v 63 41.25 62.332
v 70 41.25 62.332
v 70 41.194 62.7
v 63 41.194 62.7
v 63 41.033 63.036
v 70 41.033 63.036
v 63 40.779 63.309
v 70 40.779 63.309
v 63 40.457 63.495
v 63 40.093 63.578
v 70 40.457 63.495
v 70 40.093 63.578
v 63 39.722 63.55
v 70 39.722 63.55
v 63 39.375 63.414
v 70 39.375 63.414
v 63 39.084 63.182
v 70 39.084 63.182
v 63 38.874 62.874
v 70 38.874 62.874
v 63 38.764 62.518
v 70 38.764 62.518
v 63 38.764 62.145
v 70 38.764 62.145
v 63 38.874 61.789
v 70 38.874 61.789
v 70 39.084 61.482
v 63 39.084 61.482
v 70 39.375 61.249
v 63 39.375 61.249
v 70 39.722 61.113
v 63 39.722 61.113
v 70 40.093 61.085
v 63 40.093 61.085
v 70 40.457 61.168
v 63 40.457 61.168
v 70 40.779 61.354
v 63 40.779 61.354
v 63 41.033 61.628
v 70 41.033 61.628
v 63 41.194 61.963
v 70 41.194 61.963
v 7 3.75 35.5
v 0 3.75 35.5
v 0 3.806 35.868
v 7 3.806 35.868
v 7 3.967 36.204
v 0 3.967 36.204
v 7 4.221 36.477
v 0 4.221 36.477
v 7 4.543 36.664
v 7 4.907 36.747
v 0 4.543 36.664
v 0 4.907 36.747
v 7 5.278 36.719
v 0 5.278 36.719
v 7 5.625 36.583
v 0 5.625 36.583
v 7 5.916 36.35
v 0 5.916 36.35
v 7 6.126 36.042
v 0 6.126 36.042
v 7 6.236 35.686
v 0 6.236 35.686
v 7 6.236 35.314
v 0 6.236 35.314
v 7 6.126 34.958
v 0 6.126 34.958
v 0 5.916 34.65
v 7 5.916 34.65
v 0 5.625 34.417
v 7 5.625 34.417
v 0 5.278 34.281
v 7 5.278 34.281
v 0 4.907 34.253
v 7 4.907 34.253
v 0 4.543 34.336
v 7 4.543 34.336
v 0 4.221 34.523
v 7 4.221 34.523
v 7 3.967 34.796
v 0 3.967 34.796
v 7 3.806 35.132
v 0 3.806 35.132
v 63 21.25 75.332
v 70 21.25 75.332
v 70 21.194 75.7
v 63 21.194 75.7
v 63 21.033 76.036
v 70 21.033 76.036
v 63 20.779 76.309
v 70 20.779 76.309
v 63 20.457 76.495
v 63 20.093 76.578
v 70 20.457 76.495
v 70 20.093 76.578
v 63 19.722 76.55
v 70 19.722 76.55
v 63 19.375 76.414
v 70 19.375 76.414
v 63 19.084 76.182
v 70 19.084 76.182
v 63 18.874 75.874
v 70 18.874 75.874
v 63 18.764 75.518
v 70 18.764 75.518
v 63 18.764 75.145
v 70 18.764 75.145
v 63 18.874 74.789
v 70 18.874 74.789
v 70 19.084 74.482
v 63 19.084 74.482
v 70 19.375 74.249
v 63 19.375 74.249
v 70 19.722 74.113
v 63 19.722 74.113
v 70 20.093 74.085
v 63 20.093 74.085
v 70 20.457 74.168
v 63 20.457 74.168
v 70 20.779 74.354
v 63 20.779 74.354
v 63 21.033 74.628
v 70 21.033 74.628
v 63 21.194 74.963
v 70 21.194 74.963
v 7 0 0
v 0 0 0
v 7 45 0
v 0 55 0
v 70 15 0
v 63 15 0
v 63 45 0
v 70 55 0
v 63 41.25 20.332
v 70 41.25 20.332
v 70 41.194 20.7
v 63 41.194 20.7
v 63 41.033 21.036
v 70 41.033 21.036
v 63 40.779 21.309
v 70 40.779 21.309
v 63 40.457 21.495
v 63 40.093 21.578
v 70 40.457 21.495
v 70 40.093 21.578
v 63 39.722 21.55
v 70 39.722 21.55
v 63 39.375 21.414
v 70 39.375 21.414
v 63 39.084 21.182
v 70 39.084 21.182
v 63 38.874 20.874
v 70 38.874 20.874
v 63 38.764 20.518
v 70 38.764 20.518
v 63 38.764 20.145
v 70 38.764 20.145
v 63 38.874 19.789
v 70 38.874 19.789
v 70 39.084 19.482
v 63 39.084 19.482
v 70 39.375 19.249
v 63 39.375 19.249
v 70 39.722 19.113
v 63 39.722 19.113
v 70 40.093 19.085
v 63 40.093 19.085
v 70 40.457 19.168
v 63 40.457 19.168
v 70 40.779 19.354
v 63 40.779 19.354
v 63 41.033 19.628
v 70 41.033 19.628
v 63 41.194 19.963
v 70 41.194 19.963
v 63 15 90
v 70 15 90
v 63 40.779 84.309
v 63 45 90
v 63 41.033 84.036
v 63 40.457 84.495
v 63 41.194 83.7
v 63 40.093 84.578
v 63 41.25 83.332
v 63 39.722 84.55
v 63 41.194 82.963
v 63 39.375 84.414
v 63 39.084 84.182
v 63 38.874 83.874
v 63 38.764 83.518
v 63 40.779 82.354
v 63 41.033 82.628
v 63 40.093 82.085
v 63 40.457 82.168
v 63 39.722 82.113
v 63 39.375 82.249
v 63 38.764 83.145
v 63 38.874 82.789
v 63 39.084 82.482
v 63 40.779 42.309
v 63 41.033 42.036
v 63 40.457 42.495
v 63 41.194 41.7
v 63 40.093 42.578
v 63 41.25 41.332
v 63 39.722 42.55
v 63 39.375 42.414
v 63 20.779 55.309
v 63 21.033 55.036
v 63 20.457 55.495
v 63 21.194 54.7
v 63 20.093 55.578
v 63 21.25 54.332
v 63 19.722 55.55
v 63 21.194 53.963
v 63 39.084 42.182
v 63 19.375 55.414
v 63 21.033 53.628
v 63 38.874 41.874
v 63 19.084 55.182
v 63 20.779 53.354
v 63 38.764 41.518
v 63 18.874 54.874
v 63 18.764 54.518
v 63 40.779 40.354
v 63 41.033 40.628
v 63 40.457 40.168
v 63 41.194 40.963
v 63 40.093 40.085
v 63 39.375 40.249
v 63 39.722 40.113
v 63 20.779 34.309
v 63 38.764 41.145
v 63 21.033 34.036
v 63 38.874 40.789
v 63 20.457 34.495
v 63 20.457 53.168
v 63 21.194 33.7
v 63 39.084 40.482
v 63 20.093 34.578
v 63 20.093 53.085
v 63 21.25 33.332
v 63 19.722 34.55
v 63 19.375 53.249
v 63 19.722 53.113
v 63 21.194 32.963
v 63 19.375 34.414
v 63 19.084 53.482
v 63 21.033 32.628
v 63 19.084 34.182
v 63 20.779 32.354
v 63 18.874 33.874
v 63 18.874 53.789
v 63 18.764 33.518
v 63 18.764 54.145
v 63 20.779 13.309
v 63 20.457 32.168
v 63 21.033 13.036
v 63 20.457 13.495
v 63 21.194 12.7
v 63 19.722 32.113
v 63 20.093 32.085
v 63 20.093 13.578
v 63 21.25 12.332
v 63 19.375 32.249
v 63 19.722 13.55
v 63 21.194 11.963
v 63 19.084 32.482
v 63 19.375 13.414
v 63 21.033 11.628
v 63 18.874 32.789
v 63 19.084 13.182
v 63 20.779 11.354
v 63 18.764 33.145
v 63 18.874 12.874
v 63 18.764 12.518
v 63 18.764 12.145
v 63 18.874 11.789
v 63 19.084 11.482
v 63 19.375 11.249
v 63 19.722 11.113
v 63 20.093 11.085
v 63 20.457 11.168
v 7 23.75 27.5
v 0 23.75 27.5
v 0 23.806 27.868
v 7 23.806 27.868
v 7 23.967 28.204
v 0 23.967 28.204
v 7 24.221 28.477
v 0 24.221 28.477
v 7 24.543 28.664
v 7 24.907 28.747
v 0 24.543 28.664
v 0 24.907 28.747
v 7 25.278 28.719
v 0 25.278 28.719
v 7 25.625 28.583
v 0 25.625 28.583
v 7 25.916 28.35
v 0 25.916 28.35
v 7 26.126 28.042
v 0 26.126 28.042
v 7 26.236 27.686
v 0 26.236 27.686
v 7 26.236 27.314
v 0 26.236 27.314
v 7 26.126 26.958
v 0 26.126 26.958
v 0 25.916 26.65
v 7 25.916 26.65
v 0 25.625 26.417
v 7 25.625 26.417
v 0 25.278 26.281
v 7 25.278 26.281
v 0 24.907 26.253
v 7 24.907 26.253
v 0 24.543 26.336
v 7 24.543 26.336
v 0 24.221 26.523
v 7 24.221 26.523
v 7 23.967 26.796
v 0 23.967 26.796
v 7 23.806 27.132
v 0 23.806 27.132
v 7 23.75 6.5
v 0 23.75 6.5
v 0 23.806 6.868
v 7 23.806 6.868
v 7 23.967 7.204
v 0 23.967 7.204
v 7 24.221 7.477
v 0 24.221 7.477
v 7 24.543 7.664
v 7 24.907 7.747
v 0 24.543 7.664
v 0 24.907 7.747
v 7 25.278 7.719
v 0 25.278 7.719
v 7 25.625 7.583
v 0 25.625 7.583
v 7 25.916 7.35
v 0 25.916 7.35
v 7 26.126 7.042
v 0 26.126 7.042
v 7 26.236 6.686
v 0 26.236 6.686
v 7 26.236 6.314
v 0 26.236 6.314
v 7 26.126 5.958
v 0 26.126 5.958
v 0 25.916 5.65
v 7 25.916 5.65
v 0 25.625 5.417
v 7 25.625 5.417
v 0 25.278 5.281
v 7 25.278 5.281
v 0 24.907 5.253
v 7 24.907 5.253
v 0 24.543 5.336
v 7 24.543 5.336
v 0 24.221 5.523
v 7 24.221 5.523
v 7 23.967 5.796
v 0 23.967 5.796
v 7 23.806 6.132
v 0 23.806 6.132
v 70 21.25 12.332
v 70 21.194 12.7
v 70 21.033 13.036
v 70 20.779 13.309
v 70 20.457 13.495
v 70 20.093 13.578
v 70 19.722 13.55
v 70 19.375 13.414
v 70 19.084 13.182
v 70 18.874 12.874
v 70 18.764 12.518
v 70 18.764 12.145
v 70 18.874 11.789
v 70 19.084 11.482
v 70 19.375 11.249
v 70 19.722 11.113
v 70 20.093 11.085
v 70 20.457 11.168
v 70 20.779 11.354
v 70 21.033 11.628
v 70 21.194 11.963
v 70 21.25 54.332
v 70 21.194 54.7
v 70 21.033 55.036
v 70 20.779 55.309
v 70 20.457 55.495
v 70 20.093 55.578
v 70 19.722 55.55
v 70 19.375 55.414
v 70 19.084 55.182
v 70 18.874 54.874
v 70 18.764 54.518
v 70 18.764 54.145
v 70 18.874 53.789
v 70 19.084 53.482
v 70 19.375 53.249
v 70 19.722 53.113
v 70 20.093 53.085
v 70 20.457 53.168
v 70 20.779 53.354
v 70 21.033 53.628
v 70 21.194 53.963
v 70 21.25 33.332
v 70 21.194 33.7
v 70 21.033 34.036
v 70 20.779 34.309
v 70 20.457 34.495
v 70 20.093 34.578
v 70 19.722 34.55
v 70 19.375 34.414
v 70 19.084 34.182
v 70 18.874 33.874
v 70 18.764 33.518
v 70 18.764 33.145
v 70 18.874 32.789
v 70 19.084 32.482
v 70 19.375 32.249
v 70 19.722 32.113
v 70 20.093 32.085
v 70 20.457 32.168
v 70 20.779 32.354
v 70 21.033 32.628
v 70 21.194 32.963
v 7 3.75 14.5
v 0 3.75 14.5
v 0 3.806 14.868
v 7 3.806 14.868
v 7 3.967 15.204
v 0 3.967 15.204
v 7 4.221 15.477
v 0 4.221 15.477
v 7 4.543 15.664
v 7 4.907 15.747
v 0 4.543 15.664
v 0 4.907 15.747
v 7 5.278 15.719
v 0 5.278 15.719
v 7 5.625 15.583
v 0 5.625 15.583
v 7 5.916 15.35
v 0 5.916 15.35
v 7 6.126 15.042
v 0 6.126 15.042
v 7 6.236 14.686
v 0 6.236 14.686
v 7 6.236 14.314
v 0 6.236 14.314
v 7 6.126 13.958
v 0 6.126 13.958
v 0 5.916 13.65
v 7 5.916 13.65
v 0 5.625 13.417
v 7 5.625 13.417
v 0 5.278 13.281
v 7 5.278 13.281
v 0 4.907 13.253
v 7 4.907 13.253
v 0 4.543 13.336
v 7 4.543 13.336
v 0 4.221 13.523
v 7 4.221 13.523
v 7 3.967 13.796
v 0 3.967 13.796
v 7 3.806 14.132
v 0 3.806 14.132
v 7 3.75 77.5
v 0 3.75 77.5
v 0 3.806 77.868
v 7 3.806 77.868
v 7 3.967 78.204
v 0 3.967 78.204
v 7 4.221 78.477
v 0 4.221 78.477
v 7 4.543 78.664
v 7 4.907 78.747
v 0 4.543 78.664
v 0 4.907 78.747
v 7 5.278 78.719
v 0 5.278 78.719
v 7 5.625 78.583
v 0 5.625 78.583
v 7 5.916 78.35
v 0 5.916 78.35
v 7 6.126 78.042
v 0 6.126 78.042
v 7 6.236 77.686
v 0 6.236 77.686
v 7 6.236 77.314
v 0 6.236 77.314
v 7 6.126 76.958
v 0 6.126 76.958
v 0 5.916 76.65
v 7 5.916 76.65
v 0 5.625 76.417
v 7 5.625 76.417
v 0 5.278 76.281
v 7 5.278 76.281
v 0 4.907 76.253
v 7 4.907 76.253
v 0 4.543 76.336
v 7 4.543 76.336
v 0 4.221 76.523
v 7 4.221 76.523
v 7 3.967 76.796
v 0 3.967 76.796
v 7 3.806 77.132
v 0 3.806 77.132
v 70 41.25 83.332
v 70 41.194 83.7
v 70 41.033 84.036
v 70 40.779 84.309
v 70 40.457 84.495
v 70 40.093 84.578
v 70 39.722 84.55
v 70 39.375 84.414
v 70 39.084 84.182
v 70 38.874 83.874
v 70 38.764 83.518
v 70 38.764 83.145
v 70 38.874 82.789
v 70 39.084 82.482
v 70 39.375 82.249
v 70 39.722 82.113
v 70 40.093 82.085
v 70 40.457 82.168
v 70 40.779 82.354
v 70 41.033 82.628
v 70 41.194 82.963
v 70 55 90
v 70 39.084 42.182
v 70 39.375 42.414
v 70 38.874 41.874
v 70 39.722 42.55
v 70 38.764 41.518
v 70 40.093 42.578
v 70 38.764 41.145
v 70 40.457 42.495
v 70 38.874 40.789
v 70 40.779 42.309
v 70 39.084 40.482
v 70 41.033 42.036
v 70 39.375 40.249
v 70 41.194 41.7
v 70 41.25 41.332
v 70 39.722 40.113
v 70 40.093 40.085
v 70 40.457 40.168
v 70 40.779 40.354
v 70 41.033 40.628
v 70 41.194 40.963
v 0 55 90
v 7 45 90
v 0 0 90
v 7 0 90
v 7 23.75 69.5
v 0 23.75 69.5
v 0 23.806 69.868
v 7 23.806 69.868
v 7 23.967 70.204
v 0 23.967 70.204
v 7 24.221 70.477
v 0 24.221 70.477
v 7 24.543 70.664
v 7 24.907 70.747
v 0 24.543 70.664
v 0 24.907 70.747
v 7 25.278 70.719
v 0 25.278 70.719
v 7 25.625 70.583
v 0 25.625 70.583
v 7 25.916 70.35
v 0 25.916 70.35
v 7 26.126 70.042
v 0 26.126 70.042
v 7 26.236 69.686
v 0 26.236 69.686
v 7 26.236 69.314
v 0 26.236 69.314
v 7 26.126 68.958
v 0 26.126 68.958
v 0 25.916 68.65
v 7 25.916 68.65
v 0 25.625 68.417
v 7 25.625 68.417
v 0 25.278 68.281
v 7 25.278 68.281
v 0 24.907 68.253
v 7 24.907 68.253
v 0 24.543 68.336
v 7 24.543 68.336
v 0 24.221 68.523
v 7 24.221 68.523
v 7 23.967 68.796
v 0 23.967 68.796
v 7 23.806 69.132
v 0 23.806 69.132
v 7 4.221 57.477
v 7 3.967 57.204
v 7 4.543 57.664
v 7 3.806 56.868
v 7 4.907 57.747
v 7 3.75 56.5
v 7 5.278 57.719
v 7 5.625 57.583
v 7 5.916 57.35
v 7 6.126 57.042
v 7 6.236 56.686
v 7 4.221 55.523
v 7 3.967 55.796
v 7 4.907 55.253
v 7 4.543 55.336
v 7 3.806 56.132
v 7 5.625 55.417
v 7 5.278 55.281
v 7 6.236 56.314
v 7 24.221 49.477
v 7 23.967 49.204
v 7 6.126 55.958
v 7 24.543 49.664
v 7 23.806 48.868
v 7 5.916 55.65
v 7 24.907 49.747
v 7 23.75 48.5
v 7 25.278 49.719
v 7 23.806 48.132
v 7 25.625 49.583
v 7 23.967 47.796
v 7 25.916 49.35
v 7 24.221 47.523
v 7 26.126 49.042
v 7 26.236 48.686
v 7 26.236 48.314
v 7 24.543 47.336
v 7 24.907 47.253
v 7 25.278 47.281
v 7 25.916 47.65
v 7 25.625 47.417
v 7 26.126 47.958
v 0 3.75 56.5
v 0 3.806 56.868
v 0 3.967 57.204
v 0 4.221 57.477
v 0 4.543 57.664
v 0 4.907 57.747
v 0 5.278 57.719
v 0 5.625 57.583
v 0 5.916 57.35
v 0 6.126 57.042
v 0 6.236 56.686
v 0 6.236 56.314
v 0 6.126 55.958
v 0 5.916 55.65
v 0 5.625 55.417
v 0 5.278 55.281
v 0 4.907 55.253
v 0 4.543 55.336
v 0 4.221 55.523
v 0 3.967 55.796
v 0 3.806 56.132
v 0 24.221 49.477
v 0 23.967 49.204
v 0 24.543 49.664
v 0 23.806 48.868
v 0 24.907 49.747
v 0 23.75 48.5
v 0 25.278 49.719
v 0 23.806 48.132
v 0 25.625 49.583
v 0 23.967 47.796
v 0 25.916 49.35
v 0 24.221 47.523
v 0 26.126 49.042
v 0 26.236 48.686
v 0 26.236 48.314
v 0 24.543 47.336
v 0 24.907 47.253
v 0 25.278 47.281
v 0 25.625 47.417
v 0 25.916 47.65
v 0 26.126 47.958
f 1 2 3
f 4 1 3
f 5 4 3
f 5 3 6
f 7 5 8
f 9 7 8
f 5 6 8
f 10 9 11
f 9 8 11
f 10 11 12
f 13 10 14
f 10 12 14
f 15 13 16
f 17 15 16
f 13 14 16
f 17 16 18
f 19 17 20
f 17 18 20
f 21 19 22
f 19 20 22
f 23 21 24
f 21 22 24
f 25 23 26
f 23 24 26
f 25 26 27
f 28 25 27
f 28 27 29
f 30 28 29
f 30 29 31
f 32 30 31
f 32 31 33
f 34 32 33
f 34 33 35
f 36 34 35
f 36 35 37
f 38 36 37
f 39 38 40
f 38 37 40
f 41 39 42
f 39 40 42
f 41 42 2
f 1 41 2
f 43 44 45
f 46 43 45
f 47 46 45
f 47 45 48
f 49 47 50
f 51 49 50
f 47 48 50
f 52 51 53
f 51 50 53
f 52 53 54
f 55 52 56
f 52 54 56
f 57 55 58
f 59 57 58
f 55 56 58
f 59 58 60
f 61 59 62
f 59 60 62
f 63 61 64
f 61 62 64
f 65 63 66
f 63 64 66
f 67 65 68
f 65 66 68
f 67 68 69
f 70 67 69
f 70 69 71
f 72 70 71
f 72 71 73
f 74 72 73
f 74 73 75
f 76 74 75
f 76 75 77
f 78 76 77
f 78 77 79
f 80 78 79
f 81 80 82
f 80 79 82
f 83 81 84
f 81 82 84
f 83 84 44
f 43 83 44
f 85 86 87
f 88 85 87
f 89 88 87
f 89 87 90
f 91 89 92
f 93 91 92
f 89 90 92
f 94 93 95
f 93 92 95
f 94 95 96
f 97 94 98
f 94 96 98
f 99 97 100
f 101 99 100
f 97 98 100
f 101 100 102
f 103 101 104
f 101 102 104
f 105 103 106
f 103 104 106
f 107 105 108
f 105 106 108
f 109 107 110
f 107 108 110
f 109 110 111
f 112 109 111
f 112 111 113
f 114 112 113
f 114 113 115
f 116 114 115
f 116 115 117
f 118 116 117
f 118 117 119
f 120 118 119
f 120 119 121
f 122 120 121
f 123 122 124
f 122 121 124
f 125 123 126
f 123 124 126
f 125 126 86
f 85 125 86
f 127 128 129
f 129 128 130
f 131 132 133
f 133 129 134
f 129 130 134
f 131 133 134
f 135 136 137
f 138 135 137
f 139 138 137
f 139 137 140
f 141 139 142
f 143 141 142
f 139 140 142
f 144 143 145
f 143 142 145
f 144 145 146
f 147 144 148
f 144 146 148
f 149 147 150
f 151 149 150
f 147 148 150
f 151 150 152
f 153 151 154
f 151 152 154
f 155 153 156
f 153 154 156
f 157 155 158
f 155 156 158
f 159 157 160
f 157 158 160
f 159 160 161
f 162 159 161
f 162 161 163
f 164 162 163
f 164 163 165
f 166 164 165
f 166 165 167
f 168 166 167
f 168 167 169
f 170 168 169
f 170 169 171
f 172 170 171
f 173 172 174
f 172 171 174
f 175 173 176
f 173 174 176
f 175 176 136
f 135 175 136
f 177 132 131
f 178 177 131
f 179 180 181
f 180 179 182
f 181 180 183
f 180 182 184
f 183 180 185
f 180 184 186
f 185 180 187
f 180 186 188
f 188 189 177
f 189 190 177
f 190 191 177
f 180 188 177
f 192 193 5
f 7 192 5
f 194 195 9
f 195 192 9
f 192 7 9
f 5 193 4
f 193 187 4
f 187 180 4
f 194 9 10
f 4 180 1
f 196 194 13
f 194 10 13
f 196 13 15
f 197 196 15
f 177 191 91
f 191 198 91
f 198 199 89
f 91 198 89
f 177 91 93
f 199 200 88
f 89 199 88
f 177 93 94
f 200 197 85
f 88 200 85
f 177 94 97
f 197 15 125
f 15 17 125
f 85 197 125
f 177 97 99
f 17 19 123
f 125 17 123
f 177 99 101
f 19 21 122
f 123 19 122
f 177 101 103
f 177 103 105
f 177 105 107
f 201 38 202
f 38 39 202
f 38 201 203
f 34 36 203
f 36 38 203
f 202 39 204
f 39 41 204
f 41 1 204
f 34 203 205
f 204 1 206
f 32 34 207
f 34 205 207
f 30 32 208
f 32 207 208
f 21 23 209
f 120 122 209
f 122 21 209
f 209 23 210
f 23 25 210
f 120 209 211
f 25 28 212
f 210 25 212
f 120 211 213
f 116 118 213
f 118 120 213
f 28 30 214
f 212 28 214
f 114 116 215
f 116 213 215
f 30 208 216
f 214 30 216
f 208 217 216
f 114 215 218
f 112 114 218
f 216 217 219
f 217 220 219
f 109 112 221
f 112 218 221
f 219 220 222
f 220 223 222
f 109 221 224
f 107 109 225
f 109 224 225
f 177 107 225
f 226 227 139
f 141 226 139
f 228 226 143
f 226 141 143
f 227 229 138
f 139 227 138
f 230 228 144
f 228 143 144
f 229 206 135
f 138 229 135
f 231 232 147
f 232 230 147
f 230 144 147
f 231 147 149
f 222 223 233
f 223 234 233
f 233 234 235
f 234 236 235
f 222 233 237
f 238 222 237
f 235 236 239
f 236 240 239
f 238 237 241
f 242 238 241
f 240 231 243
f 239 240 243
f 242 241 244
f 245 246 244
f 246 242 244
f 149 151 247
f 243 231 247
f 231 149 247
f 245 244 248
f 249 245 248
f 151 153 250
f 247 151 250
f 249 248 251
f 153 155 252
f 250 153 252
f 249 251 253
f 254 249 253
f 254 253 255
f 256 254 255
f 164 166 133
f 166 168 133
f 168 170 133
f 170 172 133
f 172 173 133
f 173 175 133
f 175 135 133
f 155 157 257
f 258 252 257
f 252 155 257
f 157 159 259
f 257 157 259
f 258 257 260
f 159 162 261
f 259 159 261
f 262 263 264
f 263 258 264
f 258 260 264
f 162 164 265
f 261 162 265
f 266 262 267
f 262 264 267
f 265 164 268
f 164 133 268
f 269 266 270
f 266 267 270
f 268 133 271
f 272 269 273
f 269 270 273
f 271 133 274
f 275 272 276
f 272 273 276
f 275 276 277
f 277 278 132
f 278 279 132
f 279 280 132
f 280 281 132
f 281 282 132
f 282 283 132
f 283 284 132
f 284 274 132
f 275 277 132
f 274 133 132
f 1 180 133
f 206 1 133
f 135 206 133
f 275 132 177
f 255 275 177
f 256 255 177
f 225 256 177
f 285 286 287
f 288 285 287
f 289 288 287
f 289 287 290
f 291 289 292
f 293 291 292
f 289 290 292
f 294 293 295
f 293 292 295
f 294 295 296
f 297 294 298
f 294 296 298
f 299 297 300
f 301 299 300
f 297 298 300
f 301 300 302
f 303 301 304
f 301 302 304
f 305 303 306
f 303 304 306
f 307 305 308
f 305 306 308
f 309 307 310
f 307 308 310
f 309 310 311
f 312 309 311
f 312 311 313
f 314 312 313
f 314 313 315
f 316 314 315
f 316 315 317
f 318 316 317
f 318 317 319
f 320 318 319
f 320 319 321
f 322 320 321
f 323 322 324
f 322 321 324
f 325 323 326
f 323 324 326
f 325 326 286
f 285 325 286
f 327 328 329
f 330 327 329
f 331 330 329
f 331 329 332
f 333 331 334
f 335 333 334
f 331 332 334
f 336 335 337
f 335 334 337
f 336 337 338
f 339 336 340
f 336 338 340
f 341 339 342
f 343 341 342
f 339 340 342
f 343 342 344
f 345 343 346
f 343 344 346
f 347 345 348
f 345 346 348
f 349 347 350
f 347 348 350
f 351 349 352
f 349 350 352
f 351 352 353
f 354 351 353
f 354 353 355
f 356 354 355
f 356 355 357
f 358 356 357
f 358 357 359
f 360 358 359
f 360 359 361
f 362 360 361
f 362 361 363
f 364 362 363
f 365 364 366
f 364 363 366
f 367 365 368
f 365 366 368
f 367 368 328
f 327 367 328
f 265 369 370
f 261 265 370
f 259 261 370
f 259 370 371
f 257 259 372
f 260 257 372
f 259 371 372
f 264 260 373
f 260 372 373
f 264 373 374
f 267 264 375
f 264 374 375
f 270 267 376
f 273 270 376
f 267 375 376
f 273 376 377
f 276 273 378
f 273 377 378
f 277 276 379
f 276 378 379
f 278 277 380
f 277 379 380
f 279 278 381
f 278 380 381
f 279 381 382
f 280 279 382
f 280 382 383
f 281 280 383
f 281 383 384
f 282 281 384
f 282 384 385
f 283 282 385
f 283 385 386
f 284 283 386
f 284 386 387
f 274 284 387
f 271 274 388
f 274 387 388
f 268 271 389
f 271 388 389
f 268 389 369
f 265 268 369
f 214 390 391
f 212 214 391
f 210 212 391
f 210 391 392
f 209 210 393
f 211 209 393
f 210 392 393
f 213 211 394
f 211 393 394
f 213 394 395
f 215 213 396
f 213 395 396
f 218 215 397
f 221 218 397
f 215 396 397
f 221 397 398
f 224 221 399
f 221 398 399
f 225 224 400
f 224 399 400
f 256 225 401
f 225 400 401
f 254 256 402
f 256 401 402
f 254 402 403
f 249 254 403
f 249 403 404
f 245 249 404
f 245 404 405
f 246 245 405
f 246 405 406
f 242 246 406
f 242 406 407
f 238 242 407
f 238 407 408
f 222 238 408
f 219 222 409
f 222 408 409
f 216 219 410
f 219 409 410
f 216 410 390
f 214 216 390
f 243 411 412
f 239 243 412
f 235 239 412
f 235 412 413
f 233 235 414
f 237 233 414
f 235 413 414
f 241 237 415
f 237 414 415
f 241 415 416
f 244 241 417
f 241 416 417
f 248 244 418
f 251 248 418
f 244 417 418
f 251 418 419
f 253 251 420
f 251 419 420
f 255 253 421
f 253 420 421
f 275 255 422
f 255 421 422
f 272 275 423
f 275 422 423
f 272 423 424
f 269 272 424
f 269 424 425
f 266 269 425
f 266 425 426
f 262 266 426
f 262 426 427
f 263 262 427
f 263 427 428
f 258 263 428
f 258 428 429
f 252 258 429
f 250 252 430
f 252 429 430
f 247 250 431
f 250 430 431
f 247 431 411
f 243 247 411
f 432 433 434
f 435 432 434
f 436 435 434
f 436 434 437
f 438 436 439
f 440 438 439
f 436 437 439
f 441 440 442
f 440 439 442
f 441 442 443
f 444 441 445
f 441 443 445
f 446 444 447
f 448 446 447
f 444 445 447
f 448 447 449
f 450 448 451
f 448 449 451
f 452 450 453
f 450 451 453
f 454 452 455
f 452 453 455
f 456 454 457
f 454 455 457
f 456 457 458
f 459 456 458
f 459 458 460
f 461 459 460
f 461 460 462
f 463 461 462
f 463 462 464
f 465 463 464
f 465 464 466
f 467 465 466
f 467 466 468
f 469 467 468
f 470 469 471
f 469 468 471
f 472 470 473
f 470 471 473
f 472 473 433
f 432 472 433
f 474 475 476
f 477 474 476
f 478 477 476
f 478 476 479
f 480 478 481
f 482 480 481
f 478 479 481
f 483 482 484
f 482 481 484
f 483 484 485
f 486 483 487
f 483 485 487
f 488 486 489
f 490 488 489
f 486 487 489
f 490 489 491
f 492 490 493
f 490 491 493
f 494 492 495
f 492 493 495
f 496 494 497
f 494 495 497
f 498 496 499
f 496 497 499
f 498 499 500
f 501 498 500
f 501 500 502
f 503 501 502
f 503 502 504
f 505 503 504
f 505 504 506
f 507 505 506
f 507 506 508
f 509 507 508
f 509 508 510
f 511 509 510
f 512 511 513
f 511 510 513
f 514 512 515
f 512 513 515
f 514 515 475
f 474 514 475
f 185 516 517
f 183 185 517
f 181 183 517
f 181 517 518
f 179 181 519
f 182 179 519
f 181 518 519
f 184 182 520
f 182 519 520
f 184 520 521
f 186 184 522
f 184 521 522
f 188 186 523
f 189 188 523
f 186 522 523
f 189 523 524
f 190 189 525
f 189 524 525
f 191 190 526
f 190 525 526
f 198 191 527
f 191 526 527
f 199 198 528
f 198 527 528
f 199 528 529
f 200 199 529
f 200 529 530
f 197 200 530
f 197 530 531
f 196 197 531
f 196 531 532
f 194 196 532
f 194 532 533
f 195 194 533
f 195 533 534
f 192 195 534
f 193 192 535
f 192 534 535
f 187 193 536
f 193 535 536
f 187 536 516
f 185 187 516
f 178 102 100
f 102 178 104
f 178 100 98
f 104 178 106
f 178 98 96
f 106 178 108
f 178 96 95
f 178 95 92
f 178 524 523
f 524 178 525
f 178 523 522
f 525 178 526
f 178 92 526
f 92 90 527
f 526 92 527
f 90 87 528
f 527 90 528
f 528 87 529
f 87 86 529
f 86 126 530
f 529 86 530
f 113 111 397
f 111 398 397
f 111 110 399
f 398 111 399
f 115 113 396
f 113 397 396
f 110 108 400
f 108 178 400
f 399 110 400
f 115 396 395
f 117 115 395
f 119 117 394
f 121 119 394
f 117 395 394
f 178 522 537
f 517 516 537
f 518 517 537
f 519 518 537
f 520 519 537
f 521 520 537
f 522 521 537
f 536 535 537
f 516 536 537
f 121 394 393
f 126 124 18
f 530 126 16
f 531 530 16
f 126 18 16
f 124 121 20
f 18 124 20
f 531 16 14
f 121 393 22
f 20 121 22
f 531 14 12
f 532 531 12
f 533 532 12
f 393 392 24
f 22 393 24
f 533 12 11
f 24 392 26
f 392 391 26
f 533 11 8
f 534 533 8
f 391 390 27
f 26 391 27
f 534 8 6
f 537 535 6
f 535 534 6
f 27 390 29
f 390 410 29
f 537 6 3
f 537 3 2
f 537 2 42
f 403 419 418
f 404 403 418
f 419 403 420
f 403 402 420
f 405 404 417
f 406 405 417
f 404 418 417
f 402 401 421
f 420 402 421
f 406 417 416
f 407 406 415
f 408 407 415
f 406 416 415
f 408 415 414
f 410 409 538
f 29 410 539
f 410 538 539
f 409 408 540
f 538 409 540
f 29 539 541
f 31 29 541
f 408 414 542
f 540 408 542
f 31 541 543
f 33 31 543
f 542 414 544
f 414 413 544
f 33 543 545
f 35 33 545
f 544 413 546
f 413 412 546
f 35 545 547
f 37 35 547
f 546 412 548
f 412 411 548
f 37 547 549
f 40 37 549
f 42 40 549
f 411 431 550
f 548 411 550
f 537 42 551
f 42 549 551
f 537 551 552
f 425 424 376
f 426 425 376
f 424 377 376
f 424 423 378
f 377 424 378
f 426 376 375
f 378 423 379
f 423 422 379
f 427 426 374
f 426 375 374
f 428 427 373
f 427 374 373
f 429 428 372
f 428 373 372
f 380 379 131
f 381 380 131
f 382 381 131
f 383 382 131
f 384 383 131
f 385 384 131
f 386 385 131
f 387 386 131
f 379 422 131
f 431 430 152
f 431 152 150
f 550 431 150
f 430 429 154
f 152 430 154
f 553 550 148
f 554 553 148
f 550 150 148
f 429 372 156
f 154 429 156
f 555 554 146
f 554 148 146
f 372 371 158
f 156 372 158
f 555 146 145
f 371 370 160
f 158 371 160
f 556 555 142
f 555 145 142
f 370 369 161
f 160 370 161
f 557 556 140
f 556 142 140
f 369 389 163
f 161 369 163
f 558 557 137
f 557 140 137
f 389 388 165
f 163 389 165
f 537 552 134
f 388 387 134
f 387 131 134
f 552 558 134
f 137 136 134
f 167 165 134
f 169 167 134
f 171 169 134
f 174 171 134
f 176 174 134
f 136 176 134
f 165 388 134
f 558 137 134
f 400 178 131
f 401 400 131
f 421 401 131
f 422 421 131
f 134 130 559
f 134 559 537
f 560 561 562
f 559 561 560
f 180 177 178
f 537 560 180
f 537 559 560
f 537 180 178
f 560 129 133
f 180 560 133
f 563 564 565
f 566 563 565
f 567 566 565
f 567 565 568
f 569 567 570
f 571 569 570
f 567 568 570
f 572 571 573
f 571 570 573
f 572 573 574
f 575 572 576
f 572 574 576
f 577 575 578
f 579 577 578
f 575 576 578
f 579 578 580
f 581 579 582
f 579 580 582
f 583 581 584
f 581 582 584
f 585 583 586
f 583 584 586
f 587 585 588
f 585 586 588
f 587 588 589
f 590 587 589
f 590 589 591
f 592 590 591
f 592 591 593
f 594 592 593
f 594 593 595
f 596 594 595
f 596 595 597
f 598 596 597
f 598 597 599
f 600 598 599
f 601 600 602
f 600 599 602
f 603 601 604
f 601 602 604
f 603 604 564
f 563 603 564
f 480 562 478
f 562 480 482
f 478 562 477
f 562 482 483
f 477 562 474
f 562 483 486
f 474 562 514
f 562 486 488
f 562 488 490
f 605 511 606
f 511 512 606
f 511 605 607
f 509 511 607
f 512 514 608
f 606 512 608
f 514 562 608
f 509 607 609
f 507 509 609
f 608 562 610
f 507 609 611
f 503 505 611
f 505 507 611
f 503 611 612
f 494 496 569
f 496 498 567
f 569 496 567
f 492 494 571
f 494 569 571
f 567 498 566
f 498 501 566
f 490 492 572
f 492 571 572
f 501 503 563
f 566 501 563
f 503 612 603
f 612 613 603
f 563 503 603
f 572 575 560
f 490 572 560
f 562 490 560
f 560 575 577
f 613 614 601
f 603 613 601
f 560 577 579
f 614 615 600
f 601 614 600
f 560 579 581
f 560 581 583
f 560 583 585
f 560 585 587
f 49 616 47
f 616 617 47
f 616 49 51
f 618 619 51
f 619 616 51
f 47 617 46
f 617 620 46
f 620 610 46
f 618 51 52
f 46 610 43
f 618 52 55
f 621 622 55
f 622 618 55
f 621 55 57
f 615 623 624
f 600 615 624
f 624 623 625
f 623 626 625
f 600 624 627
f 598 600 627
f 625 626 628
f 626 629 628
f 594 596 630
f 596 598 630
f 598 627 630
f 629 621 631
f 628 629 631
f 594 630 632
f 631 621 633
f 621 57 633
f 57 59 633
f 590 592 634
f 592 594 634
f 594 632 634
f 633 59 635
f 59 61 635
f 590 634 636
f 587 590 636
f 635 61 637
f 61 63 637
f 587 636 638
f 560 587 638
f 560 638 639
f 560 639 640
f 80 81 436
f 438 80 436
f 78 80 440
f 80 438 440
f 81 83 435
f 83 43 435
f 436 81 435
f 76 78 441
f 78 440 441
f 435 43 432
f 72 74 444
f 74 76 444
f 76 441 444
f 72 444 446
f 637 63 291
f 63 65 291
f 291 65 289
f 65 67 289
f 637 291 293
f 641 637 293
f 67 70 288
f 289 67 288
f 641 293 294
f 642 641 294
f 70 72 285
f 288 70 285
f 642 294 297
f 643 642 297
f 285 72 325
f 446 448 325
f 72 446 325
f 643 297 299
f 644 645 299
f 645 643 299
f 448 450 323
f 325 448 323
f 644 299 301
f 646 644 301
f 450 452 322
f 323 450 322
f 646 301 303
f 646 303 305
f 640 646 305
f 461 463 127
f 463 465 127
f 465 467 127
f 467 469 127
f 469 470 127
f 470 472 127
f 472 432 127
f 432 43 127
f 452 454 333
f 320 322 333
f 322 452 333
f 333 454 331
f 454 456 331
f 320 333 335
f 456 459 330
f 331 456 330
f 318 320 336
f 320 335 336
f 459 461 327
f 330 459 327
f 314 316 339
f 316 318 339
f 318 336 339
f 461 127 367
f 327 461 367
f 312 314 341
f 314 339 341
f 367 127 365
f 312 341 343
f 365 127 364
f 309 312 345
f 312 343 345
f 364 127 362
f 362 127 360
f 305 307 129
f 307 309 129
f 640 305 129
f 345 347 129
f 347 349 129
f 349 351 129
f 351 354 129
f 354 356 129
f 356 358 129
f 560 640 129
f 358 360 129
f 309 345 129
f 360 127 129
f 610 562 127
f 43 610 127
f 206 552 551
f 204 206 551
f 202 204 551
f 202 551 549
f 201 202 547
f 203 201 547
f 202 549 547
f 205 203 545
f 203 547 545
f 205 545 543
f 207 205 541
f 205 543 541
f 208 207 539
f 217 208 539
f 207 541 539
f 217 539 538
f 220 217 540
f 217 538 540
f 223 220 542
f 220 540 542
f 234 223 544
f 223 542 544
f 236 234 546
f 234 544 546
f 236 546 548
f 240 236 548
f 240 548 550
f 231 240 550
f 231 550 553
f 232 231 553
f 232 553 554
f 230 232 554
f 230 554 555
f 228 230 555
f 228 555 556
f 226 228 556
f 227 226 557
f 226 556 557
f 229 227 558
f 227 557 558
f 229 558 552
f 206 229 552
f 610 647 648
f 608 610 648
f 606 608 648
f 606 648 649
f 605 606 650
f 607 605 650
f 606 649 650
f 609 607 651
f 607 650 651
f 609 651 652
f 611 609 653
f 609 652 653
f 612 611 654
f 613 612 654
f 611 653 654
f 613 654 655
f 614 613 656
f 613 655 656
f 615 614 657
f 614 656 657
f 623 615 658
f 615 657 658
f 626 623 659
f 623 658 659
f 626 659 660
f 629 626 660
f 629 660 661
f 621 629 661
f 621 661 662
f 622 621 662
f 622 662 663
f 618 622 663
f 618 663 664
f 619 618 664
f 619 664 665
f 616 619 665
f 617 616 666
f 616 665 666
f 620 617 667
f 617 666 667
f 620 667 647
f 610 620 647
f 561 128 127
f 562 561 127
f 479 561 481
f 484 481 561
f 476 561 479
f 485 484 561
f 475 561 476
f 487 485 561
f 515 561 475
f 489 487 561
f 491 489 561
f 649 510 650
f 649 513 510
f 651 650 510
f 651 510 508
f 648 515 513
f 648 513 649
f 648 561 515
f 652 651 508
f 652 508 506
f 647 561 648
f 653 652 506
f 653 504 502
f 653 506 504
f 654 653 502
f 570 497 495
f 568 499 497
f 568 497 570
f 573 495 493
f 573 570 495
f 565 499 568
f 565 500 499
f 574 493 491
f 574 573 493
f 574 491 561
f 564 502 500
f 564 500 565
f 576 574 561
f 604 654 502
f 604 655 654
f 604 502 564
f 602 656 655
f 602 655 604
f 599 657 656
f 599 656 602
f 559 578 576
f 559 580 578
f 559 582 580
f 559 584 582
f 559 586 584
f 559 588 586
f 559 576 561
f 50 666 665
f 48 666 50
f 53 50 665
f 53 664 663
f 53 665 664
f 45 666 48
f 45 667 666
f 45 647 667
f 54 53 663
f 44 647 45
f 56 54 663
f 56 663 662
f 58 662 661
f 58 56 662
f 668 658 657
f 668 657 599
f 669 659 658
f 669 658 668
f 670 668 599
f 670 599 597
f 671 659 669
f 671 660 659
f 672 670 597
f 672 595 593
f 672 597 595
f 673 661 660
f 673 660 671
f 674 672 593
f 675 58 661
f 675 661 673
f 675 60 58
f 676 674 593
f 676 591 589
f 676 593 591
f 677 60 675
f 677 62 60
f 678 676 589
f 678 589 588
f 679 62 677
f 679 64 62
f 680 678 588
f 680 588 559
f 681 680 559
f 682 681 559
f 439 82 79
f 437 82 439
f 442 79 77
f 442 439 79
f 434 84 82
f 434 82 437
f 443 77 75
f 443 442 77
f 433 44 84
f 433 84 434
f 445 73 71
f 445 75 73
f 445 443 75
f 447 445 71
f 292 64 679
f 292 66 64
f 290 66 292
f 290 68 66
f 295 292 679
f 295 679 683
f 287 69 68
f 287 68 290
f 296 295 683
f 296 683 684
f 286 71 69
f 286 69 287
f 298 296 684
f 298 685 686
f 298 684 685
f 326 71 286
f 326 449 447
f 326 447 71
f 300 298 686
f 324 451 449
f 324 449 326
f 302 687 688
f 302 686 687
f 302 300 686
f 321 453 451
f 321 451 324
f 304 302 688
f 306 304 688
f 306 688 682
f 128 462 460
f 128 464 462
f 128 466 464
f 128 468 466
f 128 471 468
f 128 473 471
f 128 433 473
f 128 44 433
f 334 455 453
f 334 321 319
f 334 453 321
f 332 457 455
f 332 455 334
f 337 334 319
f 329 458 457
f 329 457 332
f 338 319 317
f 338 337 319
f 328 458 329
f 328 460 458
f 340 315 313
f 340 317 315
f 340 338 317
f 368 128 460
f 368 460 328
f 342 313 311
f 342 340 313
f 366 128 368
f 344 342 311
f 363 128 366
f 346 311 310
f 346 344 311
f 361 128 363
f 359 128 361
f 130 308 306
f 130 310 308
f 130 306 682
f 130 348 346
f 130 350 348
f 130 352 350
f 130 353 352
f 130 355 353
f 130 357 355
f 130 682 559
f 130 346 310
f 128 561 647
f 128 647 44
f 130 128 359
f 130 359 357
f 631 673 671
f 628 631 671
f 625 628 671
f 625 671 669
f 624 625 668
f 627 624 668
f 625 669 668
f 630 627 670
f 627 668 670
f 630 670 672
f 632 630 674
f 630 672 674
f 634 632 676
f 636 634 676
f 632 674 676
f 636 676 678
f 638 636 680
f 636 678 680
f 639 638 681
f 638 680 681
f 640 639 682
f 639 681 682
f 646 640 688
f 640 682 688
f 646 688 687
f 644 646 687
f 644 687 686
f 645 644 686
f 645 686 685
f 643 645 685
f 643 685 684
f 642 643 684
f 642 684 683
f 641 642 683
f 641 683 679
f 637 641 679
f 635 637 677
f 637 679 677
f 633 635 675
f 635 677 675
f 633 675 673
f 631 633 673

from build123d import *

# Parameters (mm, degrees)
SKETCH1_W               = 70
SKETCH1_H               = 55
BOSS_EXTRUDE1_DEPTH     = 90
CUT_EXTRUDE1_DEPTH      = 127.589889012
CUT_EXTRUDE1_DEPTH_BACK = 127.589889012
SKETCH3_R               = 1.25
CUT_EXTRUDE2_DEPTH      = 7
SKETCH4_R               = 1.25
CUT_EXTRUDE4_DEPTH      = 7


with BuildPart() as part:
    # Sketch1 → Boss-Extrude1 (new body)
    with BuildSketch(Plane.XY):
        with Locations((35, 27.5)):
            Rectangle(SKETCH1_W, SKETCH1_H)
    extrude(amount=BOSS_EXTRUDE1_DEPTH)

    # Sketch2 → Cut-Extrude1 (cut, two sides: drawn at the far end of the back side and taken through both)
    with BuildSketch(Plane.XY.offset(90).offset(-CUT_EXTRUDE1_DEPTH_BACK)):
        Polygon((7, 0), (7, 45), (63, 45), (63, 15), (70, 15), (70, 0), (60, 0), align=None)
    extrude(amount=CUT_EXTRUDE1_DEPTH + CUT_EXTRUDE1_DEPTH_BACK, mode=Mode.SUBTRACT)

    # Sketch3 → Cut-Extrude2 (cut)
    with BuildSketch(Plane.ZY):
        with Locations(Location((6.5, 25, 0), (0, 0, 270))):
            Circle(SKETCH3_R)
        with Locations(Location((14.5, 5, 0), (0, 0, 270))):
            Circle(SKETCH3_R)
        with Locations(Location((27.5, 25, 0), (0, 0, 270))):
            Circle(SKETCH3_R)
        with Locations(Location((35.5, 5, 0), (0, 0, 270))):
            Circle(SKETCH3_R)
        with Locations(Location((48.5, 25, 0), (0, 0, 270))):
            Circle(SKETCH3_R)
        with Locations(Location((56.5, 5, 0), (0, 0, 270))):
            Circle(SKETCH3_R)
        with Locations(Location((69.5, 25, 0), (0, 0, 270))):
            Circle(SKETCH3_R)
        with Locations(Location((77.5, 5, 0), (0, 0, 270))):
            Circle(SKETCH3_R)
    extrude(amount=-CUT_EXTRUDE2_DEPTH, mode=Mode.SUBTRACT)

    # Sketch4 → Cut-Extrude4 (cut)
    with BuildSketch(Plane(origin=(70, 0, 0), x_dir=(0, 0, -1), z_dir=(1, 0, 0))):
        with Locations(Location((-83.331764561, 40, 0), (0, 0, 90))):
            Circle(SKETCH4_R)
        with Locations(Location((-75.331764561, 20, 0), (0, 0, 90))):
            Circle(SKETCH4_R)
        with Locations(Location((-62.331764561, 40, 0), (0, 0, 90))):
            Circle(SKETCH4_R)
        with Locations(Location((-54.331764561, 20, 0), (0, 0, 90))):
            Circle(SKETCH4_R)
        with Locations(Location((-41.331764561, 40, 0), (0, 0, 90))):
            Circle(SKETCH4_R)
        with Locations(Location((-33.331764561, 20, 0), (0, 0, 90))):
            Circle(SKETCH4_R)
        with Locations(Location((-20.331764561, 40, 0), (0, 0, 90))):
            Circle(SKETCH4_R)
        with Locations(Location((-12.331764561, 20, 0), (0, 0, 90))):
            Circle(SKETCH4_R)
    extrude(amount=-CUT_EXTRUDE4_DEPTH, mode=Mode.SUBTRACT)


solid = part.part
